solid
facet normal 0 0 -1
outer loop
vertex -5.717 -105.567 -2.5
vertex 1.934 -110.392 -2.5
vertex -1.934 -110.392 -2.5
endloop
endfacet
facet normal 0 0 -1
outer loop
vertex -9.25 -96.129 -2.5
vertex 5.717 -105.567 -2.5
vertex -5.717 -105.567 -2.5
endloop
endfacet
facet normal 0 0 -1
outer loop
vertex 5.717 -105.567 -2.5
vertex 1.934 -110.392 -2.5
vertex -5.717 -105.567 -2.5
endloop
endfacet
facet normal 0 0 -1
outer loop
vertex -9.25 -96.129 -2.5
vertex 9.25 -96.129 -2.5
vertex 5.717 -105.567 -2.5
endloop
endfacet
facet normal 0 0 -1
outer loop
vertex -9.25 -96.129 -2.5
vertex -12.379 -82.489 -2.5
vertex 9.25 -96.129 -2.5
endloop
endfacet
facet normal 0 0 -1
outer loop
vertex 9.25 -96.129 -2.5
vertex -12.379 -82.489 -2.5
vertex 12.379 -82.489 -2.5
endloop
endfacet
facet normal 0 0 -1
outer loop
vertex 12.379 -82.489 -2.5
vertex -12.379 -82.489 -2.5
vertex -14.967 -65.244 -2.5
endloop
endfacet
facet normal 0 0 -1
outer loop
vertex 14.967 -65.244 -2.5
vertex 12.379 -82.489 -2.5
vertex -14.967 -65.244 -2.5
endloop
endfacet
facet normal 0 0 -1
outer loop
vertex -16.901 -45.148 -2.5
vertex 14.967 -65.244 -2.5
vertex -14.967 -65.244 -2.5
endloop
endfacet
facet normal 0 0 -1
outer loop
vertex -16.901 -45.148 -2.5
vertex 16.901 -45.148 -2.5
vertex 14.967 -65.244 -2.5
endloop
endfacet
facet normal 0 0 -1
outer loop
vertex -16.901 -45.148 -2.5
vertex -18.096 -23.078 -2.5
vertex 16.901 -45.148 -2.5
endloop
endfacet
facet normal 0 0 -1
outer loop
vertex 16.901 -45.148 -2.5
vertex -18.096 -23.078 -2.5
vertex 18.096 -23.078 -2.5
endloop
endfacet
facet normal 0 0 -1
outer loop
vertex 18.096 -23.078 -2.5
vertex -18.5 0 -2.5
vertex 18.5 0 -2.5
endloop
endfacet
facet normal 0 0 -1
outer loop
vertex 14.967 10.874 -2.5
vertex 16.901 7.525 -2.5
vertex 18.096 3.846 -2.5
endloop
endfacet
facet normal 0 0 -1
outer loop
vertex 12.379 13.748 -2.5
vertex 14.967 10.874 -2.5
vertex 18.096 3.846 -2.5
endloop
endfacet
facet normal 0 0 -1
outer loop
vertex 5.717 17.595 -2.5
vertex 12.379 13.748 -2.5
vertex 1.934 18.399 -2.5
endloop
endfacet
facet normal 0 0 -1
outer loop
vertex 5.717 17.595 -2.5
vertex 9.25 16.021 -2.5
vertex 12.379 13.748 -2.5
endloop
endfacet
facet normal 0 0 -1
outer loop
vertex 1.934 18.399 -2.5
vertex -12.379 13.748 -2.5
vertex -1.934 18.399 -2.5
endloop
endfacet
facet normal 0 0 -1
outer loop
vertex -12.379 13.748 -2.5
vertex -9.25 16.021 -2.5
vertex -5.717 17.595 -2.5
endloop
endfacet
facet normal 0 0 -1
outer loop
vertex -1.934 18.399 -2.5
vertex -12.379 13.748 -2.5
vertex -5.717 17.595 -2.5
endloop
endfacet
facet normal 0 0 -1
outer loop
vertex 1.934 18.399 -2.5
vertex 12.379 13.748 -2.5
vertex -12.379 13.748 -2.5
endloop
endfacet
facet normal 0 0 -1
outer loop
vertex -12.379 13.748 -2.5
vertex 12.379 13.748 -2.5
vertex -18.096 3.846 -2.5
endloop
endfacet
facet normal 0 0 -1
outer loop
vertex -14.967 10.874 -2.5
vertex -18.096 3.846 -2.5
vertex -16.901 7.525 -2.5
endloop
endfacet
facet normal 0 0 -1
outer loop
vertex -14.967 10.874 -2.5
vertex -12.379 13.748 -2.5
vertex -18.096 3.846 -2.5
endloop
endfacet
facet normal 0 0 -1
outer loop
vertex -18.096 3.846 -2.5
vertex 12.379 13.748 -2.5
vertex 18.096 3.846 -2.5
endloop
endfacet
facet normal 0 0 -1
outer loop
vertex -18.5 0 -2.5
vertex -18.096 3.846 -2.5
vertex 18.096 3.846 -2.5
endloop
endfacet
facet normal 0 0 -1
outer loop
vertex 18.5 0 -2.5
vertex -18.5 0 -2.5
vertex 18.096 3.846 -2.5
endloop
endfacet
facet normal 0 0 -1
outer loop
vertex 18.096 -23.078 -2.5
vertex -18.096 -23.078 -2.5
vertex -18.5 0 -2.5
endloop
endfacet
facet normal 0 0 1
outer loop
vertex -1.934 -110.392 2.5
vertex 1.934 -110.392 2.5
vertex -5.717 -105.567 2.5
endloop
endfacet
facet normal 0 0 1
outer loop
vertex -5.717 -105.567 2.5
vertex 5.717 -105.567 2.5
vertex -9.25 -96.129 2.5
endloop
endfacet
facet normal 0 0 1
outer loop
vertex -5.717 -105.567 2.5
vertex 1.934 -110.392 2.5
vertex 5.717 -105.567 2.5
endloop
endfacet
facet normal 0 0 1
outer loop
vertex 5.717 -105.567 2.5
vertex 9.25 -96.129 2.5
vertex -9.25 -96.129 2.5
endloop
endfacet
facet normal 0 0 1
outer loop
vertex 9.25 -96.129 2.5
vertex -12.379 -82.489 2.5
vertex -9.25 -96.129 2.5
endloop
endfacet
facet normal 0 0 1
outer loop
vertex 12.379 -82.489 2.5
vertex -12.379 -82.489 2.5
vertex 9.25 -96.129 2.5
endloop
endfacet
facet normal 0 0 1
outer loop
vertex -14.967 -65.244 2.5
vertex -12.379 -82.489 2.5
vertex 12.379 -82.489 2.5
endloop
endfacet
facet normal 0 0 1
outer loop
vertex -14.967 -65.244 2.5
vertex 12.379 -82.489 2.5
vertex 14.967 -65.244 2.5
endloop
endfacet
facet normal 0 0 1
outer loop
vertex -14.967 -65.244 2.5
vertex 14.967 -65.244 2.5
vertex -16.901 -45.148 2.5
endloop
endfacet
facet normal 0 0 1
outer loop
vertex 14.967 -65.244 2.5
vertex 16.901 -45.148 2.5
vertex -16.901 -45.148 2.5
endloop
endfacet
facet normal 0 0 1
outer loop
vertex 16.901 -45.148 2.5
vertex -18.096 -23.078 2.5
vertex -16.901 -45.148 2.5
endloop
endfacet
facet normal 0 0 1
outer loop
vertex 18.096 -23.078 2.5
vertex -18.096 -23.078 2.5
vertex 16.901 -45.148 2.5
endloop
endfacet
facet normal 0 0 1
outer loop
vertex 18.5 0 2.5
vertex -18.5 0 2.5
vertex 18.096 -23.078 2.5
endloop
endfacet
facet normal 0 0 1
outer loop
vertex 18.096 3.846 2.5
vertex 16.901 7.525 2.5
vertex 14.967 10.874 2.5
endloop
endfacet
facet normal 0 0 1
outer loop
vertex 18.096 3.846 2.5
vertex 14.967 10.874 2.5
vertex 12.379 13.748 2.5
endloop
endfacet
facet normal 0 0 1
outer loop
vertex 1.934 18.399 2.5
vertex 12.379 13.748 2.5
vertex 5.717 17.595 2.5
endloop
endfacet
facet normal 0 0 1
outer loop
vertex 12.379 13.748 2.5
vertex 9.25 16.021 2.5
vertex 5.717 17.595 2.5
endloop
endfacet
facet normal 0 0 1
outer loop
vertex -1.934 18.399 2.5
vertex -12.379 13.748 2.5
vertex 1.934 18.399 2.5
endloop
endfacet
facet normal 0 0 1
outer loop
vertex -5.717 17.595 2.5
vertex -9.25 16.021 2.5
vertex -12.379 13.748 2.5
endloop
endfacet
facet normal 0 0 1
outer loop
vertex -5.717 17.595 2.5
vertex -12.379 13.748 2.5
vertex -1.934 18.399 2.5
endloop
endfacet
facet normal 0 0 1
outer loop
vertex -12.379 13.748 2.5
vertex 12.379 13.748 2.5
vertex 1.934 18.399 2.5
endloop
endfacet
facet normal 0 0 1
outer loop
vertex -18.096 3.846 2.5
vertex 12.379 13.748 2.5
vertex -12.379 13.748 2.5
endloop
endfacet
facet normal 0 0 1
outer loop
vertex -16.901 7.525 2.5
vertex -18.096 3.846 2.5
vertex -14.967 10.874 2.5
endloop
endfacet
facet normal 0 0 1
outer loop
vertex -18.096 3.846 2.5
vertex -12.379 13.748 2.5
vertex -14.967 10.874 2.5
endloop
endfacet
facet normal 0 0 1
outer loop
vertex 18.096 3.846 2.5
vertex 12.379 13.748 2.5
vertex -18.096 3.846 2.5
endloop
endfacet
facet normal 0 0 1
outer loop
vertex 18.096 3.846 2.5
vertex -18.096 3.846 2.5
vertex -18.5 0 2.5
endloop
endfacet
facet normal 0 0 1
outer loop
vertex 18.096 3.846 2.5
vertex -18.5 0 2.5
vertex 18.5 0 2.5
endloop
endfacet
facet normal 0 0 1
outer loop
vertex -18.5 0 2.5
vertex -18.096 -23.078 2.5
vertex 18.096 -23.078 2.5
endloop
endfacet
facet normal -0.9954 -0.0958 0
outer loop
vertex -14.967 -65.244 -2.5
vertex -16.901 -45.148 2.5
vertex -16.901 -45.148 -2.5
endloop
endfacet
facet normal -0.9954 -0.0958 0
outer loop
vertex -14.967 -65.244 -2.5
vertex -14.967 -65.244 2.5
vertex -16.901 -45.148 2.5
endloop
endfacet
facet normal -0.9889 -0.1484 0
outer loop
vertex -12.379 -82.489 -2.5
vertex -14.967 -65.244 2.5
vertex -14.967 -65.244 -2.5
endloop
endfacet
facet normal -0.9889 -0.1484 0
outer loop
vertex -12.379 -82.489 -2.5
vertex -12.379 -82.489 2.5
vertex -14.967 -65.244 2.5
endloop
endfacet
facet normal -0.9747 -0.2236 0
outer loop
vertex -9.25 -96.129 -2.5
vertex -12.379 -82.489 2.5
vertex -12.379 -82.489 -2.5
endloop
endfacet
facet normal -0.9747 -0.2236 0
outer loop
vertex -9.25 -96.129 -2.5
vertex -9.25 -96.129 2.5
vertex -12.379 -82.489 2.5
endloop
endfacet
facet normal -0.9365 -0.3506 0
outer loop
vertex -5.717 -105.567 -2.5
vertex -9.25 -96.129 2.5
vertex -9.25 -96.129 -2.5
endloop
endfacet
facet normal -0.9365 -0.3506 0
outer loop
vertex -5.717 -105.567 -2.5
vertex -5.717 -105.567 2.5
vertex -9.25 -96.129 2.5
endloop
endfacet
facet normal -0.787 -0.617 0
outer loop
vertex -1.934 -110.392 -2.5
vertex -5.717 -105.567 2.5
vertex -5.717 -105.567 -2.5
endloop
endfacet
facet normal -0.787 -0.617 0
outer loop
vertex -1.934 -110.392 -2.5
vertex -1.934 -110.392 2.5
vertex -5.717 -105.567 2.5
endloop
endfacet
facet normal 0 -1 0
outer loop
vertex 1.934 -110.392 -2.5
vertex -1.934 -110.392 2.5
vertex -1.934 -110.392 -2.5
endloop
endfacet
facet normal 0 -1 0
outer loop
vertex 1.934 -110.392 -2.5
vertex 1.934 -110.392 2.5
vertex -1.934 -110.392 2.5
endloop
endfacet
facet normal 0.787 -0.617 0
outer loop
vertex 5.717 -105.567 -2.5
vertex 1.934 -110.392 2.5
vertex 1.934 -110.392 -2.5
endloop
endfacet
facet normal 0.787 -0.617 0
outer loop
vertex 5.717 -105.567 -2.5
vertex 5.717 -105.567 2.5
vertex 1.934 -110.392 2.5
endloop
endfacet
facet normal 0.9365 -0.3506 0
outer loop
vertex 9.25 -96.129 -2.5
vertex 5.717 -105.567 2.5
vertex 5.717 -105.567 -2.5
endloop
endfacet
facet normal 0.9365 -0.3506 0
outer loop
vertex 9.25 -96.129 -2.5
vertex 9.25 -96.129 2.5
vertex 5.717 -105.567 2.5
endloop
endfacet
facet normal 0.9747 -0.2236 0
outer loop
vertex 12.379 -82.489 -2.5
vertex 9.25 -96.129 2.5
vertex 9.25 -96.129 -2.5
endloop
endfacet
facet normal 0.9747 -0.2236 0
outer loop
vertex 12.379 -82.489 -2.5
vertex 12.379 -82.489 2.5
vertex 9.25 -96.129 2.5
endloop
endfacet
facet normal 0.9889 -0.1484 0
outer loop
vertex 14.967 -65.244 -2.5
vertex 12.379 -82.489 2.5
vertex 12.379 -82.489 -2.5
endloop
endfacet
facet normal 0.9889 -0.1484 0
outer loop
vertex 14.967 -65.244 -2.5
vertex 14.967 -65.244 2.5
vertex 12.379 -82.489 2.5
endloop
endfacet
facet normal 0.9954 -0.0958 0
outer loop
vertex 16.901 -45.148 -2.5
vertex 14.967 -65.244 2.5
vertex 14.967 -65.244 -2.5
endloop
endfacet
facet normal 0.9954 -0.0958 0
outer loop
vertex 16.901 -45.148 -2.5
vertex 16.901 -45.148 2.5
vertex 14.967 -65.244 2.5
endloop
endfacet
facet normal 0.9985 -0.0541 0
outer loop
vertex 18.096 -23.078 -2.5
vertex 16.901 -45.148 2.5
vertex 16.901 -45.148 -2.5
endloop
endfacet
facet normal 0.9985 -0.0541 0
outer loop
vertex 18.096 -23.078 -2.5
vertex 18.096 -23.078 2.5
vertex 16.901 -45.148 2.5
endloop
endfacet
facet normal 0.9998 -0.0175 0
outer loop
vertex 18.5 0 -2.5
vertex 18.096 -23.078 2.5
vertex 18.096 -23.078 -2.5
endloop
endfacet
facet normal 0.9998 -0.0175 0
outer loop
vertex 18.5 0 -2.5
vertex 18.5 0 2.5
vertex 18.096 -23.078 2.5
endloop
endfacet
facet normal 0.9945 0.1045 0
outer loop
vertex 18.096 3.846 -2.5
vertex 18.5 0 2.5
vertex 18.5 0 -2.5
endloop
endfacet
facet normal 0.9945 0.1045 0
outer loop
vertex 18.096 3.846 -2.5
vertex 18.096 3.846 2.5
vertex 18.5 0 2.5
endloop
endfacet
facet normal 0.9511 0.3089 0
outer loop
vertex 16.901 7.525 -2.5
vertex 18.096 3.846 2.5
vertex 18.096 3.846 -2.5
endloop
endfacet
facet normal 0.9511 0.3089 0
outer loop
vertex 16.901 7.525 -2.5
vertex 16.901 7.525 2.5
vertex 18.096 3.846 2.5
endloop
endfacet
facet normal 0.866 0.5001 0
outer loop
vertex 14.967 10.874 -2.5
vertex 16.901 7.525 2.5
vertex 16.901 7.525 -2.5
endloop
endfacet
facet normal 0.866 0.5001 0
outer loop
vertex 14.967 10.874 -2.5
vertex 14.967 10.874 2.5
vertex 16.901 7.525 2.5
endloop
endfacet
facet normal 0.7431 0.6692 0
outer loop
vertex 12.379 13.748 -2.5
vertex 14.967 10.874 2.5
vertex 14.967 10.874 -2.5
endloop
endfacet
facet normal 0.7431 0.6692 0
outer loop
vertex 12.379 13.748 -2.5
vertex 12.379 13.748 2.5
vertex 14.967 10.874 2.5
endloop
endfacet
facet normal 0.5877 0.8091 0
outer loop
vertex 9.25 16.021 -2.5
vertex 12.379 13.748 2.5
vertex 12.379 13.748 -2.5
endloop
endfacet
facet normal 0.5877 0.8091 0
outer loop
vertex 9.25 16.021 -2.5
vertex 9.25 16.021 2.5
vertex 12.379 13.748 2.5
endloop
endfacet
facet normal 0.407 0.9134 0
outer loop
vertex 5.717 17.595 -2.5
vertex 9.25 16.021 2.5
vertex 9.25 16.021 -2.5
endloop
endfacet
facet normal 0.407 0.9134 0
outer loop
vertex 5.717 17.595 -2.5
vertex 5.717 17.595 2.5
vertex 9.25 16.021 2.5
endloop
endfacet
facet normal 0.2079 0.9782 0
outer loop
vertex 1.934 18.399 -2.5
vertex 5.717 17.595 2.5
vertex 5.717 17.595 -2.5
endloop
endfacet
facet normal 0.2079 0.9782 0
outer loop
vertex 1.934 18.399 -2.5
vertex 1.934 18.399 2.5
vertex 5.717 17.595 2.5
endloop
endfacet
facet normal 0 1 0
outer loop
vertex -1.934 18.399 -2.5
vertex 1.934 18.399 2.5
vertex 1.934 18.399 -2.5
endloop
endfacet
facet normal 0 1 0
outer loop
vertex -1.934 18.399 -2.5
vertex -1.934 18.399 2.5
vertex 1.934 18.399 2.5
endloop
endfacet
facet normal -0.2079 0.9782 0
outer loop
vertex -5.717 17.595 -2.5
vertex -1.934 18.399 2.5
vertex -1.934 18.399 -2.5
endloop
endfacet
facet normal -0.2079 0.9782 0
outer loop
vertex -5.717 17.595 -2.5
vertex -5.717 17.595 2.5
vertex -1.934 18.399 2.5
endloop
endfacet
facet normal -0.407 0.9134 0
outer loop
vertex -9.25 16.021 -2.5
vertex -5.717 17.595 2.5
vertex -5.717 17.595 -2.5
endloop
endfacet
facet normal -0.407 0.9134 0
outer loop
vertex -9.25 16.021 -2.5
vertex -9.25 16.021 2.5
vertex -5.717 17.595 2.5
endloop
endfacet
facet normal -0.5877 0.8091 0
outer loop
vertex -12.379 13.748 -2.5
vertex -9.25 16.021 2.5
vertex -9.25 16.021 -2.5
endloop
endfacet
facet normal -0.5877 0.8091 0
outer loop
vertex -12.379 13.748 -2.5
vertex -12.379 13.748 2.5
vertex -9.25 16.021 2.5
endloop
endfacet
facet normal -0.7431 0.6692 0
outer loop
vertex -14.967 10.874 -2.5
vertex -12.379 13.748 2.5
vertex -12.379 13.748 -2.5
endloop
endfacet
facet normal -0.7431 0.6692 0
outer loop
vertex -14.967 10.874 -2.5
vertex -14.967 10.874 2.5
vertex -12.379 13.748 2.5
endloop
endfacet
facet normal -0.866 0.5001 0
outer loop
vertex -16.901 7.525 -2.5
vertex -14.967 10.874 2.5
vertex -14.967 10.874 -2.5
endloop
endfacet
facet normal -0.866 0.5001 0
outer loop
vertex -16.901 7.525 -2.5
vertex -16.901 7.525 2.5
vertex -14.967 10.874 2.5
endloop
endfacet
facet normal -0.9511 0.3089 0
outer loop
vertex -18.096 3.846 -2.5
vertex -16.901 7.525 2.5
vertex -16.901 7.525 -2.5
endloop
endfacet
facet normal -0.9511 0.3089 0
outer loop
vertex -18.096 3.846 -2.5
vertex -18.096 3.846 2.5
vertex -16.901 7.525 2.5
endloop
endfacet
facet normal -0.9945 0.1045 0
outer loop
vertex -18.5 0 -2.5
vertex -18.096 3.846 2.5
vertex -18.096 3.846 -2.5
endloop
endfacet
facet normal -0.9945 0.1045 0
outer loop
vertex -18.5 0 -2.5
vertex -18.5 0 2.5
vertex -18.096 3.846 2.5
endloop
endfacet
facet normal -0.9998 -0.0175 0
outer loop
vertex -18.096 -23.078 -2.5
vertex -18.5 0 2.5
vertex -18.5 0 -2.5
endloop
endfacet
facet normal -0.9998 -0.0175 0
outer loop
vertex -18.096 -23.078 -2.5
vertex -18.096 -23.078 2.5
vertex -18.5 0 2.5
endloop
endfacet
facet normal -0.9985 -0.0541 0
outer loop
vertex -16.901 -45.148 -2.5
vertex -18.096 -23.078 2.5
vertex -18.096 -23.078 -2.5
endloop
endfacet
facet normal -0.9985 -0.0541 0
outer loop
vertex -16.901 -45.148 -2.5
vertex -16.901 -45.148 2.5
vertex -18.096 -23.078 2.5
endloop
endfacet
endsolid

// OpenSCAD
module centerBoard(width = 37.0, wlRatio = 6.0, thickness = 5.0) {
    
    linear_extrude(height = thickness, center = true) {
    union() {
        difference() {
            scale([1.0, wlRatio]) {
                circle(d=width);
            }
            translate([- width / 2, 0, 0]) {
                square([width, width * wlRatio / 2], center=false);
            }
        }
        circle(d=width);
    }
}
}

centerBoard();
